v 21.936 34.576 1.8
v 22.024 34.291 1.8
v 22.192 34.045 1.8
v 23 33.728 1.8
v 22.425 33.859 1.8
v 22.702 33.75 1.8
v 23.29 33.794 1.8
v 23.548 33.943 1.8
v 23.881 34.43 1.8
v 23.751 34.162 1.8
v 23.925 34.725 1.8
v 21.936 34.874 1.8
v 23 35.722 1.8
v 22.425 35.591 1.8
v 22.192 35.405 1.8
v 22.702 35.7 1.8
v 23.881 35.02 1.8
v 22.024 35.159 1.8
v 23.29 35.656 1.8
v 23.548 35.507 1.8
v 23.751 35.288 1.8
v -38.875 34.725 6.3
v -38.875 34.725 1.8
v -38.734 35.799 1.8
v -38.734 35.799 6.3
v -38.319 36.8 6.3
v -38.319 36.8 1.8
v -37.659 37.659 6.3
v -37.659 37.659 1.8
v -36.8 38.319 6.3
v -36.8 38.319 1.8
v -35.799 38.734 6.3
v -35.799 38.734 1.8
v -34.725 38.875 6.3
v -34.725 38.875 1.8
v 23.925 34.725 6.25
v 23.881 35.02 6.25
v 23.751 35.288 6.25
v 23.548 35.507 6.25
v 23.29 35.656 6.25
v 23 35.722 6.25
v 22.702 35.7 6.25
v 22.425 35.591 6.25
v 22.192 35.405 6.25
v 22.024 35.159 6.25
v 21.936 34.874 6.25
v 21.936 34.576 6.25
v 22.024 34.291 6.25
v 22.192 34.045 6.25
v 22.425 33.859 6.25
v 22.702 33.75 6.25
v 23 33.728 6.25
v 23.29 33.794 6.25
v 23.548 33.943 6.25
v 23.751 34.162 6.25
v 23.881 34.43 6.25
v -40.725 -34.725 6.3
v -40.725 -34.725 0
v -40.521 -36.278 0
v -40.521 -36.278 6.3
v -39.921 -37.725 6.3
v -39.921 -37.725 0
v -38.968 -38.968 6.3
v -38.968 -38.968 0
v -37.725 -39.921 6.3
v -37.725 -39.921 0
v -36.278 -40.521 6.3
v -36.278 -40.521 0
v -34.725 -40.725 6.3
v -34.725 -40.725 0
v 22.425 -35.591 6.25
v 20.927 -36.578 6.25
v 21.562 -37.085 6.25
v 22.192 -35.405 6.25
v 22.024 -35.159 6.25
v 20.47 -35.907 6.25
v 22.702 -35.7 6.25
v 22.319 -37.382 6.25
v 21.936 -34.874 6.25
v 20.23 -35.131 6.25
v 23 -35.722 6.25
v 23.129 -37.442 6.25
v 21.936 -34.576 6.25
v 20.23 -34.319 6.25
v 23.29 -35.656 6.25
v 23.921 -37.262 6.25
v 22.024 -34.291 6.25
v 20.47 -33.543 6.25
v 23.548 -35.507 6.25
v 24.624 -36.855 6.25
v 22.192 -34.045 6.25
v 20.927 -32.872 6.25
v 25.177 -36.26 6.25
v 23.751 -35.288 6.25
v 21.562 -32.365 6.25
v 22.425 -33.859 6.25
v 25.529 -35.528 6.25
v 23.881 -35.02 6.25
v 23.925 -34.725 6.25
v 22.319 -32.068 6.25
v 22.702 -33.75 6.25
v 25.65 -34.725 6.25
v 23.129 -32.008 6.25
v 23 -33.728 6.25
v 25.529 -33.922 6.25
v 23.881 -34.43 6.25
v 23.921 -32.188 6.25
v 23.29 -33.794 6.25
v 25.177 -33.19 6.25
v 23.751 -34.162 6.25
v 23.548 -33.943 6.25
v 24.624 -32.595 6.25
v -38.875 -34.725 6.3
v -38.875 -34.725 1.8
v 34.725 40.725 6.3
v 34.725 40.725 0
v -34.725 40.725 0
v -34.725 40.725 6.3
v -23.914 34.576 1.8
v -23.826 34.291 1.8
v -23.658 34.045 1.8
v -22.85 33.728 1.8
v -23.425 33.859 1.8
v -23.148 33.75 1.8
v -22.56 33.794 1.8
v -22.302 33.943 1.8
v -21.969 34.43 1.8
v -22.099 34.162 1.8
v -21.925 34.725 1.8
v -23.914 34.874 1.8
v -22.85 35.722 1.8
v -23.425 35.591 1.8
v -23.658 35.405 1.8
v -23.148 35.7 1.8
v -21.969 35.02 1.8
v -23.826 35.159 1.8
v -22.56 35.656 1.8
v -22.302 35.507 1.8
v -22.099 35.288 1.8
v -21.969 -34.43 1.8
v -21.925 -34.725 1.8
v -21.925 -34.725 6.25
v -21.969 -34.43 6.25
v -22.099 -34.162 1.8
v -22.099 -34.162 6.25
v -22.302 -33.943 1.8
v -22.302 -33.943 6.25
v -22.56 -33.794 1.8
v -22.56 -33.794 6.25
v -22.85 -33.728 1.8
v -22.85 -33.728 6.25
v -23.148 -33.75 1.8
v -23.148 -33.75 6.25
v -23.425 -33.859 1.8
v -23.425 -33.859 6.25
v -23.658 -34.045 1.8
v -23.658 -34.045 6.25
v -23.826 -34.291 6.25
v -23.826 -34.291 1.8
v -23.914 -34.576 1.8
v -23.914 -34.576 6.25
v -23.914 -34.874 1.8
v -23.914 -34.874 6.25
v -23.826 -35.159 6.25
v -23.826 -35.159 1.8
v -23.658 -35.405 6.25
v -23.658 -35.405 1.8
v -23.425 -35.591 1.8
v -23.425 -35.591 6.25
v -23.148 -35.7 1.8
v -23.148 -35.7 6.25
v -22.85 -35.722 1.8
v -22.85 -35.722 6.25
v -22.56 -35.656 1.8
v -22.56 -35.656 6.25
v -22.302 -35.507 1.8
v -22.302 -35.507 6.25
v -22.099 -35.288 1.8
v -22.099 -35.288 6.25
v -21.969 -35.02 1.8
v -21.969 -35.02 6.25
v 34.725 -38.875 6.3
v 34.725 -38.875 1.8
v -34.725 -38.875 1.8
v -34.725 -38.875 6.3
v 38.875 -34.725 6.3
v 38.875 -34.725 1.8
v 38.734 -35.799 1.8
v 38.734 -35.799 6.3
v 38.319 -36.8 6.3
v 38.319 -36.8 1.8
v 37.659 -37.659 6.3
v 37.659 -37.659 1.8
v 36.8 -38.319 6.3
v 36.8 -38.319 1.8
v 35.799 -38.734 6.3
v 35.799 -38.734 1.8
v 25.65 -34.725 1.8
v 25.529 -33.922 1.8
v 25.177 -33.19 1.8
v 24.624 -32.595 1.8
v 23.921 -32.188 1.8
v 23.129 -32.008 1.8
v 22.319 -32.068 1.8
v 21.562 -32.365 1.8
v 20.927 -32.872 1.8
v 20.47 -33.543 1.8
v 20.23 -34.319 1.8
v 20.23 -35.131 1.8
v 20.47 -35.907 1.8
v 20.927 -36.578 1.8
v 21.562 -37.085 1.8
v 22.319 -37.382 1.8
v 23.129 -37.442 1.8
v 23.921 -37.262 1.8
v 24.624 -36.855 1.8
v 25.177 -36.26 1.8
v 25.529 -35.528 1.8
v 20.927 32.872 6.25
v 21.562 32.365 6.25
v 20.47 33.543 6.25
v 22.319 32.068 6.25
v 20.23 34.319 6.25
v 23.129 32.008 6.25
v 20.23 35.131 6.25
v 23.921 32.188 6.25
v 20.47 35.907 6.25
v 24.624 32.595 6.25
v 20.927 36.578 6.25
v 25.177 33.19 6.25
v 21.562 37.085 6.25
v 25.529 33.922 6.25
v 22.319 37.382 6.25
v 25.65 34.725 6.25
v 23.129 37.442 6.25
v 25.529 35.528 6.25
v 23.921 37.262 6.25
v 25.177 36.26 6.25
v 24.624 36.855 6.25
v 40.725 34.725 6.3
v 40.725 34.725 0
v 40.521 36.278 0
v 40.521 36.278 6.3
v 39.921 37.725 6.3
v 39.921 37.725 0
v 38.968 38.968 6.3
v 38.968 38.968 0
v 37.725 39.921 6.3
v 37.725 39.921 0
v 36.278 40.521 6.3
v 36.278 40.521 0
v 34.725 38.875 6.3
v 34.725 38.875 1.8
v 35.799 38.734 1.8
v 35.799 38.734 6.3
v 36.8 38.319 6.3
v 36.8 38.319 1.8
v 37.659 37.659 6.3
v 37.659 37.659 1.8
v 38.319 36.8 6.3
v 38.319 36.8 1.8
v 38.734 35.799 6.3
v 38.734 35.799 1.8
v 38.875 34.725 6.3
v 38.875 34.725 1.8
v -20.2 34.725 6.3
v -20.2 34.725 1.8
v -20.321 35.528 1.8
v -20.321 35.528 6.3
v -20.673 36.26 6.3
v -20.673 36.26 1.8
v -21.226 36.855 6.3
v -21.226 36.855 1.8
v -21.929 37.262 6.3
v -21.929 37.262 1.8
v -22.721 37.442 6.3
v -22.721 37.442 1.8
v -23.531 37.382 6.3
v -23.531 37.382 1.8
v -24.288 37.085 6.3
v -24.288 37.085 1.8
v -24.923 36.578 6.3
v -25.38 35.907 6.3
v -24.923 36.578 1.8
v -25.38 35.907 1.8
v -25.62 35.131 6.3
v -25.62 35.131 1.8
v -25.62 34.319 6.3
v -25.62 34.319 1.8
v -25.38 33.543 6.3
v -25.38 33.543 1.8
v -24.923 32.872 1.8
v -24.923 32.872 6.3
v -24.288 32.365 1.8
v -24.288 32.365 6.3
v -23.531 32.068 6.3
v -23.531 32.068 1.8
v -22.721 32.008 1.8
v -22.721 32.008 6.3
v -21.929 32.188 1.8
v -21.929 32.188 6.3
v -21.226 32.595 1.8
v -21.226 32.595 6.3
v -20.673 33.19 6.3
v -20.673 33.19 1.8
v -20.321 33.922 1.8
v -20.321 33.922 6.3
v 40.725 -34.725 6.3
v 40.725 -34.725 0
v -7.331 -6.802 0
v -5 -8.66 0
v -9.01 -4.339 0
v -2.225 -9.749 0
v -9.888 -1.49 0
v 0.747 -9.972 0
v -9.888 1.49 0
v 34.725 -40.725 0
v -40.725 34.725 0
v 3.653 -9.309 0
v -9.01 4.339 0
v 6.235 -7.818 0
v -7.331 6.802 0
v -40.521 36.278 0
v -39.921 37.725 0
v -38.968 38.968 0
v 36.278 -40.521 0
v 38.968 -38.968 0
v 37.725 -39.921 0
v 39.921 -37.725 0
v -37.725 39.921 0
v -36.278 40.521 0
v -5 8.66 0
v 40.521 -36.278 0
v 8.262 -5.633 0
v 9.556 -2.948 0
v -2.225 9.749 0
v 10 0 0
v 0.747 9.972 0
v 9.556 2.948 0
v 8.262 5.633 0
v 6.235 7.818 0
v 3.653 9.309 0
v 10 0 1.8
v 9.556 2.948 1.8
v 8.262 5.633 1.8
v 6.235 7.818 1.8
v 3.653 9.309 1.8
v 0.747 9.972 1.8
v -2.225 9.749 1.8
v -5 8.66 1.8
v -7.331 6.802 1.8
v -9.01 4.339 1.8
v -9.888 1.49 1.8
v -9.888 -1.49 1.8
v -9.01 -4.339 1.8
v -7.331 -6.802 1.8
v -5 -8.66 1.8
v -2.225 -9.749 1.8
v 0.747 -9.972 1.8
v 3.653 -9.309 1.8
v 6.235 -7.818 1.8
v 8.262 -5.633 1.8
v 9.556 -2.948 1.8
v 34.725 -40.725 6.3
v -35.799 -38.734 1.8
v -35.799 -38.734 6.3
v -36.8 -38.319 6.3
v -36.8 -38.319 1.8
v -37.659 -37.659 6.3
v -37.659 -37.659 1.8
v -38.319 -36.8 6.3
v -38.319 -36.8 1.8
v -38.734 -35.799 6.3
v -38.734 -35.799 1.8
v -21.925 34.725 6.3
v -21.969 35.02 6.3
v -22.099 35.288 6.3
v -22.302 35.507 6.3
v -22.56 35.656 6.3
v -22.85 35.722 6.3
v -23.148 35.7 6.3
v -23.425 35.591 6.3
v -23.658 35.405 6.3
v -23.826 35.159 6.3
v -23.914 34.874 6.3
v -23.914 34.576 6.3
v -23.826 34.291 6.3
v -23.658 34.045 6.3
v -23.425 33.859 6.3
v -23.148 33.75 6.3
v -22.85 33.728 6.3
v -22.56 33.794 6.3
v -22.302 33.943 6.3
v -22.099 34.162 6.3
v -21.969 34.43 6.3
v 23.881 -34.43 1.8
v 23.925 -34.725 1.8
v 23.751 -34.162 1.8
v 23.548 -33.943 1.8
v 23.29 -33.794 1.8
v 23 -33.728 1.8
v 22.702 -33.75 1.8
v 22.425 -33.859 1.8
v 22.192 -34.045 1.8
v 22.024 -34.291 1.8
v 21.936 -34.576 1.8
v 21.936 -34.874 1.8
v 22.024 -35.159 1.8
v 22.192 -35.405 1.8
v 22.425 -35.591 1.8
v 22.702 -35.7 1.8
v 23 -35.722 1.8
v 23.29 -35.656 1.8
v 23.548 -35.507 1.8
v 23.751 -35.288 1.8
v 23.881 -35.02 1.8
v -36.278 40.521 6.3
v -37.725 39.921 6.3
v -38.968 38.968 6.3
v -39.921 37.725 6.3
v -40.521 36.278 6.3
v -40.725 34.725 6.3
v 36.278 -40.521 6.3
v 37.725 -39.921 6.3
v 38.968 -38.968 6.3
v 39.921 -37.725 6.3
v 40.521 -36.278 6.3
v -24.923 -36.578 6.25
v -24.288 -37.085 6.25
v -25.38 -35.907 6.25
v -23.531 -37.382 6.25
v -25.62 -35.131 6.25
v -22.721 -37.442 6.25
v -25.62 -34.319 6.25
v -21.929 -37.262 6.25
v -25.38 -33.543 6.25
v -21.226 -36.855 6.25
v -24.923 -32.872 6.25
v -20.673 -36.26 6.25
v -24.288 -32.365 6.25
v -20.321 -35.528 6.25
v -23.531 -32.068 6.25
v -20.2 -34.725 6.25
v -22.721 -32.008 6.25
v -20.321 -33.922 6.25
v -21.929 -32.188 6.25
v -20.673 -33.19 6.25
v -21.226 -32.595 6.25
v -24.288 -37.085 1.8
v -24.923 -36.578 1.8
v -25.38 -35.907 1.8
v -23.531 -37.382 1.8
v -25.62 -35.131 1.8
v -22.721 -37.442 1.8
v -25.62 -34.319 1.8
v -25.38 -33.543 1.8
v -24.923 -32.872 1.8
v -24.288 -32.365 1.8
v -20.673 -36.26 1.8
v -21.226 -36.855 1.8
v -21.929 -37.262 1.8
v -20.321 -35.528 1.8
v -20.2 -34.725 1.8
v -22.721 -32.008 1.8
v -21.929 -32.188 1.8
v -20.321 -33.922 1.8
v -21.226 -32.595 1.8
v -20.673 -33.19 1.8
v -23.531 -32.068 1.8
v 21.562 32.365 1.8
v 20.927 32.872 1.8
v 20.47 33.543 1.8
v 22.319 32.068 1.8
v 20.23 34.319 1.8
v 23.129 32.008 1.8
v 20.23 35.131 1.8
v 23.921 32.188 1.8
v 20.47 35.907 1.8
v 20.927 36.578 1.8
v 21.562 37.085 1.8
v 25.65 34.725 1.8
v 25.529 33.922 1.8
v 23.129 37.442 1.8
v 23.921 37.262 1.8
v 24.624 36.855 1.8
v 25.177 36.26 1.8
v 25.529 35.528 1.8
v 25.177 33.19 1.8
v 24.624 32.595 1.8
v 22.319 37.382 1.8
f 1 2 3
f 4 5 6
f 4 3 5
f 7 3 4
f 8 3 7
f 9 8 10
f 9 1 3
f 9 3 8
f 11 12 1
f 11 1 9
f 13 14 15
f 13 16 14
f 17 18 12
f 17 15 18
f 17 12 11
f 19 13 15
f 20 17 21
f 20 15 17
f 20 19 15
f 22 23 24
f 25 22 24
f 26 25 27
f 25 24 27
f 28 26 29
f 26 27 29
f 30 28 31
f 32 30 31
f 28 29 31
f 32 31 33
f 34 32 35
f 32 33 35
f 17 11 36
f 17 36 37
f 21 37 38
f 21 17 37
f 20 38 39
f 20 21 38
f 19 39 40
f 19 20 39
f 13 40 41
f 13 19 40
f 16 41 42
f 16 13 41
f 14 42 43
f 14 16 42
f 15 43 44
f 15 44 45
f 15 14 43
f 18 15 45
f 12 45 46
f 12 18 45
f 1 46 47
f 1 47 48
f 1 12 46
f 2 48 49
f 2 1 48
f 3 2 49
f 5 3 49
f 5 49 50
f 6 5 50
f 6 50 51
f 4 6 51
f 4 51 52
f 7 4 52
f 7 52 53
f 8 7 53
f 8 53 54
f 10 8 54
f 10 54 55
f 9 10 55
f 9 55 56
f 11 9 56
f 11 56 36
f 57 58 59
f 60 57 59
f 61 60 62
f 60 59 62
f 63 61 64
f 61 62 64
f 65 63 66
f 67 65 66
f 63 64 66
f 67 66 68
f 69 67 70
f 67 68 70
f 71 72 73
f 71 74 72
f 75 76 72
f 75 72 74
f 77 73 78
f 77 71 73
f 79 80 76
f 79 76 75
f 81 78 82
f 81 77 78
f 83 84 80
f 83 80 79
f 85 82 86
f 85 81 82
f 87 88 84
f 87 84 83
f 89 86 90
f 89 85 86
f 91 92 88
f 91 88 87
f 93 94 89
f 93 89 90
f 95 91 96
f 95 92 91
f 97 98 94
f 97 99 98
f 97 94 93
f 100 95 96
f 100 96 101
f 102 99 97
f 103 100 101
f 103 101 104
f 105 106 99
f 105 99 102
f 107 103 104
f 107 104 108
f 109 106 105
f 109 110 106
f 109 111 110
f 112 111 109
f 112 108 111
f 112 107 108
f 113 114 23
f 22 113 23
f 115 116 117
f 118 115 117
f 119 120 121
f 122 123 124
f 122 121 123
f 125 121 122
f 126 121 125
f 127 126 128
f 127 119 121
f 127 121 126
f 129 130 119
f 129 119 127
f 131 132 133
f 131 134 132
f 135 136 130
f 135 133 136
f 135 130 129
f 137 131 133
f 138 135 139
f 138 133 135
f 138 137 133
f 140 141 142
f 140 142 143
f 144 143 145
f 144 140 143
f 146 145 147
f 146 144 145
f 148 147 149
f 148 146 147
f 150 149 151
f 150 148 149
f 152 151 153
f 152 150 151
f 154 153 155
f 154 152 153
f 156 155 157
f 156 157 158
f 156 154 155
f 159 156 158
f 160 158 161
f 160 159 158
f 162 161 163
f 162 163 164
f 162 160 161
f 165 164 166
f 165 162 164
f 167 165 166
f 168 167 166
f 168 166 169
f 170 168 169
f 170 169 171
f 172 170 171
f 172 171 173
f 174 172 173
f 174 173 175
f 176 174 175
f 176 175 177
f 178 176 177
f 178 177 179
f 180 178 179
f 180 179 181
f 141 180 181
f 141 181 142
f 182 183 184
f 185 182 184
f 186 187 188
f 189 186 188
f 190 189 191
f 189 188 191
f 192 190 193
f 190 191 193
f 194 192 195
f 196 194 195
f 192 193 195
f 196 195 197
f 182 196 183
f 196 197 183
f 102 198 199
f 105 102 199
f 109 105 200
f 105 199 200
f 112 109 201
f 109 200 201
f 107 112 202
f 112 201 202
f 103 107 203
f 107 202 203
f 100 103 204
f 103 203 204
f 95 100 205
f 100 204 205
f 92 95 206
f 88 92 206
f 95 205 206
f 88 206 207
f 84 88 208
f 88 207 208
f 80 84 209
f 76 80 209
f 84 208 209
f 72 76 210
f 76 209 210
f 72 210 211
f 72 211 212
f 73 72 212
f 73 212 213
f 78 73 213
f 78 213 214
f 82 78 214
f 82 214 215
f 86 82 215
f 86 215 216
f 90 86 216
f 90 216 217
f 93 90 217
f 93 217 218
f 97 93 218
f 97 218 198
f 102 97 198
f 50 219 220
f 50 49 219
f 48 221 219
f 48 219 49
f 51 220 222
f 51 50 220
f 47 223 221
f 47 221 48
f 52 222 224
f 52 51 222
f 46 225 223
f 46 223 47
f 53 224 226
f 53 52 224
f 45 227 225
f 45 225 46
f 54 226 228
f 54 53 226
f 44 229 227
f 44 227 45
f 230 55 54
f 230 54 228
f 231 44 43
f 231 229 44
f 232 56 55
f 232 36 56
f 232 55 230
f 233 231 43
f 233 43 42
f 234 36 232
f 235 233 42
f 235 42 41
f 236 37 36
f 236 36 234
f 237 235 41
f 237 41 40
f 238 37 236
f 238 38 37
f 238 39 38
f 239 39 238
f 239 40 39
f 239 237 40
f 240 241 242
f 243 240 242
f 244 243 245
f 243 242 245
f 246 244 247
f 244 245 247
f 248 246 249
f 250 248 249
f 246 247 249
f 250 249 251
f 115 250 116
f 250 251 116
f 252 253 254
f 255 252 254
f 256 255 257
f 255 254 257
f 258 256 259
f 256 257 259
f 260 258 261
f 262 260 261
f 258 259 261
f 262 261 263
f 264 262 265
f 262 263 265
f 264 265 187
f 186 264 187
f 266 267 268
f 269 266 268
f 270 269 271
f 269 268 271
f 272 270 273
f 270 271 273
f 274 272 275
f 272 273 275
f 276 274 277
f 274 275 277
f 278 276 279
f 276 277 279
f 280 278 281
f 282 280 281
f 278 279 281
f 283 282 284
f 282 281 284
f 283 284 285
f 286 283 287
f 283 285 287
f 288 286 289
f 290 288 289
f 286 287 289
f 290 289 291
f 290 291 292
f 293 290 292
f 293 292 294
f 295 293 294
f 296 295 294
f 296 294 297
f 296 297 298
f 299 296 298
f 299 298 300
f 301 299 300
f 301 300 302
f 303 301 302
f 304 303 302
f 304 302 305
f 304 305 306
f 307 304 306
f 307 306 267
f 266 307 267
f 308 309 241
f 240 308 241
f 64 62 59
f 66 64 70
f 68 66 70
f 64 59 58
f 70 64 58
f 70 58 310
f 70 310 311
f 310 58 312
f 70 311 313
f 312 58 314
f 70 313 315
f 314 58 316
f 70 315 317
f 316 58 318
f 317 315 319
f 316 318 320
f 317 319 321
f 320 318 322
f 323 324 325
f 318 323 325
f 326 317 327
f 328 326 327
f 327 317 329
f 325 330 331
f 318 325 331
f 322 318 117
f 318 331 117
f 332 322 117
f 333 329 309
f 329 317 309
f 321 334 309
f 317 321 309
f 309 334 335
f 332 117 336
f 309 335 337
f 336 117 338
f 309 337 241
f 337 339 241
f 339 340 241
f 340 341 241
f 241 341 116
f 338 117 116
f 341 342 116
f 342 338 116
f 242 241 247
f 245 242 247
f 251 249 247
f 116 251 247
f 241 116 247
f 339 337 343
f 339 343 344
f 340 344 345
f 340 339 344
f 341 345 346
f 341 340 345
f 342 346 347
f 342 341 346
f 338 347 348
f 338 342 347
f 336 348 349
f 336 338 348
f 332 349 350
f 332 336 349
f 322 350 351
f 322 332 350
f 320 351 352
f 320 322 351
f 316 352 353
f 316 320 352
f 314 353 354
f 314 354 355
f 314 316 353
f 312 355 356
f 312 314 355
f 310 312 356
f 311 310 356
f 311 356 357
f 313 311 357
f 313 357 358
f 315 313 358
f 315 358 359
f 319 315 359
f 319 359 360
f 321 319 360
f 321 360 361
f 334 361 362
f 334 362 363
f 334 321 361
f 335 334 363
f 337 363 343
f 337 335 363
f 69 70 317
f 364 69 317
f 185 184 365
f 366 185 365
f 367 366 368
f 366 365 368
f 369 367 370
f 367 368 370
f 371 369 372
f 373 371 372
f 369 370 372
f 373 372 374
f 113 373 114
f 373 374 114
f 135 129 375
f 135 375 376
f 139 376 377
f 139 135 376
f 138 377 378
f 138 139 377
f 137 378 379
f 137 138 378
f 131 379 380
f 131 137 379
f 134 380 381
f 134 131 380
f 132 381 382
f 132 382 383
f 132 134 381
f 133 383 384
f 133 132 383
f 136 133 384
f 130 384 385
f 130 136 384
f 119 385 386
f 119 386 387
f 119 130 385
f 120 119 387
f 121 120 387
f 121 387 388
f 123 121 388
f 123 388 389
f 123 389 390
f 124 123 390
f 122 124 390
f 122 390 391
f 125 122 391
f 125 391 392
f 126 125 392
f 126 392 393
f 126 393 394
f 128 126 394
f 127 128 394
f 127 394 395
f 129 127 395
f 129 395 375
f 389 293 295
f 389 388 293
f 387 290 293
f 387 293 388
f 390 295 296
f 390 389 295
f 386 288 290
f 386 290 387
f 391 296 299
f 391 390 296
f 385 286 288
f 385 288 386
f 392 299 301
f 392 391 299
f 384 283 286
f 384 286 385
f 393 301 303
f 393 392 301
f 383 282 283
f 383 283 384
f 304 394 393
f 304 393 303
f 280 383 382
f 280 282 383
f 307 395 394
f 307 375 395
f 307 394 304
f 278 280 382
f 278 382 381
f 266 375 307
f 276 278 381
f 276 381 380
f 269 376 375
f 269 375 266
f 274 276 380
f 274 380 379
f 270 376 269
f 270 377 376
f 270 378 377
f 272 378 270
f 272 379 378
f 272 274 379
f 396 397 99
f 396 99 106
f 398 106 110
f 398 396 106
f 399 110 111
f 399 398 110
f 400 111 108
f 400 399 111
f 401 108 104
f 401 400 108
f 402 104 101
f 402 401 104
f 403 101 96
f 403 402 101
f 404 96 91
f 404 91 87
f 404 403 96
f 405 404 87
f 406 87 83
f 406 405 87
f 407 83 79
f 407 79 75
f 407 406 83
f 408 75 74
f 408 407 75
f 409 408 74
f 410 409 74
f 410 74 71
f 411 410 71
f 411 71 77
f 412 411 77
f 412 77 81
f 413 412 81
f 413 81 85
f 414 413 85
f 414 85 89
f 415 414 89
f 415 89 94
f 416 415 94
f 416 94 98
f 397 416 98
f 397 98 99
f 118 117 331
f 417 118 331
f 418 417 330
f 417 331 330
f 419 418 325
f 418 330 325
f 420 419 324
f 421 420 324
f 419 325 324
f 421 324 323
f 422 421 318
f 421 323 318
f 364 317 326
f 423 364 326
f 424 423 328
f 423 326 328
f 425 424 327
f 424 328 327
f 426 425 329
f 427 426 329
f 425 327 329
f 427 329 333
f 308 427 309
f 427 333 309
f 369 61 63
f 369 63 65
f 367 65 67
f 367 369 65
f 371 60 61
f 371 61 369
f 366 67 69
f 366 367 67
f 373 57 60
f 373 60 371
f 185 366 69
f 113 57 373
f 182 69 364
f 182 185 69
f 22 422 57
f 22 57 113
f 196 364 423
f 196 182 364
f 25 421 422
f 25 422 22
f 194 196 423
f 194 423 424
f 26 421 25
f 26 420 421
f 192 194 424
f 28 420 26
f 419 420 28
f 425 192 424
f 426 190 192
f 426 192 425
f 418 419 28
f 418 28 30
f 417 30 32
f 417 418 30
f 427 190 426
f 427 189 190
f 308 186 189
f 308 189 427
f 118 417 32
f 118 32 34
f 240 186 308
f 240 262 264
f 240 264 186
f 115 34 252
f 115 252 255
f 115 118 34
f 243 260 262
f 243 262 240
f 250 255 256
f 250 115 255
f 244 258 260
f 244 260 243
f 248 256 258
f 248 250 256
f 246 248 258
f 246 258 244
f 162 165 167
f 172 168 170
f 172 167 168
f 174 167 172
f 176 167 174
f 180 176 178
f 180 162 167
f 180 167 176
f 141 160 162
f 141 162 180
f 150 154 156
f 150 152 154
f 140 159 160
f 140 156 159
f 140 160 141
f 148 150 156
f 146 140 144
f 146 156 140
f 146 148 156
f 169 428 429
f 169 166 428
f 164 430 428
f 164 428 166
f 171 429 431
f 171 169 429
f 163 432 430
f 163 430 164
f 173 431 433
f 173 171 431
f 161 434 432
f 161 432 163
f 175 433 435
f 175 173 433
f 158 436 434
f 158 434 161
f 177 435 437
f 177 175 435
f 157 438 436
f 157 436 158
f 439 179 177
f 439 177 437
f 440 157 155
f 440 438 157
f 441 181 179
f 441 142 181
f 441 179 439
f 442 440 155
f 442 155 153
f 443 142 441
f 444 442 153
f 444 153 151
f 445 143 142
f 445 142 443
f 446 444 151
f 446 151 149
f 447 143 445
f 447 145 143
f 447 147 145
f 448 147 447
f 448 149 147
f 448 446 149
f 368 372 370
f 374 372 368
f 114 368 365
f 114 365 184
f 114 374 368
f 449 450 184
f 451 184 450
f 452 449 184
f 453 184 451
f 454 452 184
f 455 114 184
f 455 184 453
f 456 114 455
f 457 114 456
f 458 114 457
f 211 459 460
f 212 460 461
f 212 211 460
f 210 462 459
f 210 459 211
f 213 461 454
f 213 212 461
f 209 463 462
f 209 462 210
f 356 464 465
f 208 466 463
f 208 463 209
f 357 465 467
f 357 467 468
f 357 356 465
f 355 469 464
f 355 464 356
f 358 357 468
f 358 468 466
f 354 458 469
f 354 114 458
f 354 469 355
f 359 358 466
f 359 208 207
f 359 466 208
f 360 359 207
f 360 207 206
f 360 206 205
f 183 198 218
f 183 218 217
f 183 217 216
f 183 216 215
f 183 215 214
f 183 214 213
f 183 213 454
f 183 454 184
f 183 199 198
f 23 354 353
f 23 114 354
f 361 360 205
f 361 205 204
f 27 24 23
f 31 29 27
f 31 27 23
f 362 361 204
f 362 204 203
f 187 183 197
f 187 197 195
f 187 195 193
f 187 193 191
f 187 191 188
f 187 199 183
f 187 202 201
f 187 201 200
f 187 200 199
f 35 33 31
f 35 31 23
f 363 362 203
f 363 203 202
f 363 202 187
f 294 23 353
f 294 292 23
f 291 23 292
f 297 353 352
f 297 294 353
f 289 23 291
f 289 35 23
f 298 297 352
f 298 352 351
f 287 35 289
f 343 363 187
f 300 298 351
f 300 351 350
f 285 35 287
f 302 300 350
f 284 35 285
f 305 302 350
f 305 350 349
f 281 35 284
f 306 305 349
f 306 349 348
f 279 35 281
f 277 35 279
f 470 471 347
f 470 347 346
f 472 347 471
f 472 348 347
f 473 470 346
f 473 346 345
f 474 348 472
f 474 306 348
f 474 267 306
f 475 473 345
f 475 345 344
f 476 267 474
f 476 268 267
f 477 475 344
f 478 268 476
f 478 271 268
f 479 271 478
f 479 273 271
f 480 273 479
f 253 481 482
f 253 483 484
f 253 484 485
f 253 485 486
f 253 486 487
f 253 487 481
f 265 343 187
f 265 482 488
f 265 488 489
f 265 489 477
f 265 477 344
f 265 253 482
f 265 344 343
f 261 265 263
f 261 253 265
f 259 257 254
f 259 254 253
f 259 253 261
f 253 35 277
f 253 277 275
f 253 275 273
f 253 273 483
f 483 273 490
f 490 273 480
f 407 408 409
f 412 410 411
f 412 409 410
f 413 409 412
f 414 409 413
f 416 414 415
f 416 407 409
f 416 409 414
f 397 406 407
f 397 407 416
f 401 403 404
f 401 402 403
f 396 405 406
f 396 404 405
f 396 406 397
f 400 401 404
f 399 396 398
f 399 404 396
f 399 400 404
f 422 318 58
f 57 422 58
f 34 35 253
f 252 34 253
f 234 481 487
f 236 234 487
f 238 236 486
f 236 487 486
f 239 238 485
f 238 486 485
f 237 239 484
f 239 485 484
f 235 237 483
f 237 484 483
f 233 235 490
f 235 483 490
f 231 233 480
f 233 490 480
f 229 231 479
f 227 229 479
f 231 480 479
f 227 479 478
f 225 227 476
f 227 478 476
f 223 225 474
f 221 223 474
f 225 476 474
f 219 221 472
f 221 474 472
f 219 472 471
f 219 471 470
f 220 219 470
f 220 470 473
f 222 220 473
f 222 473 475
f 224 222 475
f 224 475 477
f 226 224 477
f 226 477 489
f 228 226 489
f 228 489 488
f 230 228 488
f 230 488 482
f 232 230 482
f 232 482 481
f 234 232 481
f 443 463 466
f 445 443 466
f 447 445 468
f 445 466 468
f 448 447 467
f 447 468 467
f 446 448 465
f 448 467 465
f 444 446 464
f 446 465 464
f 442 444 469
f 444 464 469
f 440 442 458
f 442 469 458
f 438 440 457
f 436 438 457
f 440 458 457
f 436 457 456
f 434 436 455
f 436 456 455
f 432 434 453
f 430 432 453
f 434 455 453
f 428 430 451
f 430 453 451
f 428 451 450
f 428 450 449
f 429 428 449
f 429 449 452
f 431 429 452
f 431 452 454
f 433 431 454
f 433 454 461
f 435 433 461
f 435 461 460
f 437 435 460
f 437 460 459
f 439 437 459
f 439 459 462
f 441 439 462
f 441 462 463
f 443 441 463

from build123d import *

# Parameters (mm, degrees)
F0_R     = 2.725
F0_R_2   = 10
F0_R_3   = 1
F1_DEPTH = 1.8
F2_DEPTH = 6.3
F3_DEPTH = 6.3
F4_DEPTH = 6.25


with BuildPart() as f1:
    # F0 (on Top) → F1 (new body)
    with BuildSketch(Plane.XY):
        with BuildLine():
            Line((38.875, -34.725), (38.875, 34.725))
            ThreePointArc((38.875, 34.725), (37.659493, 37.659493), (34.725, 38.875))
            Line((34.725, 38.875), (-34.725, 38.875))
            ThreePointArc((-34.725, 38.875), (-37.659493, 37.659493), (-38.875, 34.725))
            Line((-38.875, 34.725), (-38.875, -34.725))
            ThreePointArc((-38.875, -34.725), (-37.659493, -37.659493), (-34.725, -38.875))
            Line((-34.725, -38.875), (34.725, -38.875))
            ThreePointArc((34.725, -38.875), (37.659493, -37.659493), (38.875, -34.725))
        make_face()
        with Locations((-22.925, -34.725)):
            Circle(F0_R, mode=Mode.SUBTRACT)
        with Locations((22.925, -34.725)):
            Circle(F0_R, mode=Mode.SUBTRACT)
        with Locations((-22.925, 34.725)):
            Circle(F0_R, mode=Mode.SUBTRACT)
        Circle(F0_R_2, mode=Mode.SUBTRACT)
        with Locations((22.925, 34.725)):
            Circle(F0_R, mode=Mode.SUBTRACT)
        with Locations((-22.925, 34.725)):
            Circle(F0_R)
        with Locations((-22.925, 34.725)):
            Circle(F0_R_3, mode=Mode.SUBTRACT)
        with Locations((-22.925, 34.725)):
            Circle(F0_R_3)
        with Locations((22.925, -34.725)):
            Circle(F0_R)
        with Locations((22.925, -34.725)):
            Circle(F0_R_3, mode=Mode.SUBTRACT)
        with Locations((22.925, -34.725)):
            Circle(F0_R_3)
        with Locations((-22.925, -34.725)):
            Circle(F0_R)
        with Locations((-22.925, -34.725)):
            Circle(F0_R_3, mode=Mode.SUBTRACT)
        with Locations((-22.925, -34.725)):
            Circle(F0_R_3)
        with Locations((22.925, 34.725)):
            Circle(F0_R)
        with Locations((22.925, 34.725)):
            Circle(F0_R_3, mode=Mode.SUBTRACT)
        with Locations((22.925, 34.725)):
            Circle(F0_R_3)
    extrude(amount=F1_DEPTH)

    # F0 (on Top) → F2 (join)
    with BuildSketch(Plane.XY):
        with BuildLine():
            Line((-34.725, -40.725), (34.725, -40.725))
            ThreePointArc((34.725, -40.725), (38.967641, -38.967641), (40.725, -34.725))
            Line((40.725, -34.725), (40.725, 34.725))
            ThreePointArc((40.725, 34.725), (38.967641, 38.967641), (34.725, 40.725))
            Line((34.725, 40.725), (-34.725, 40.725))
            ThreePointArc((-34.725, 40.725), (-38.967641, 38.967641), (-40.725, 34.725))
            Line((-40.725, 34.725), (-40.725, -34.725))
            ThreePointArc((-40.725, -34.725), (-38.967641, -38.967641), (-34.725, -40.725))
        make_face()
        with BuildLine():
            ThreePointArc((34.725, 38.875), (37.659493, 37.659493), (38.875, 34.725))
            Line((38.875, 34.725), (38.875, -34.725))
            ThreePointArc((38.875, -34.725), (37.659493, -37.659493), (34.725, -38.875))
            Line((34.725, -38.875), (-34.725, -38.875))
            ThreePointArc((-34.725, -38.875), (-37.659493, -37.659493), (-38.875, -34.725))
            Line((-38.875, -34.725), (-38.875, 34.725))
            ThreePointArc((-38.875, 34.725), (-37.659493, 37.659493), (-34.725, 38.875))
            Line((-34.725, 38.875), (34.725, 38.875))
        make_face(mode=Mode.SUBTRACT)
    extrude(amount=F2_DEPTH)

    # F0 (on Top) → F3 (join)
    with BuildSketch(Plane.XY):
        with Locations((-22.925, 34.725)):
            Circle(F0_R)
        with Locations((-22.925, 34.725)):
            Circle(F0_R_3, mode=Mode.SUBTRACT)
    extrude(amount=F3_DEPTH)

    # F0 (on Top) → F4 (join)
    with BuildSketch(Plane.XY):
        with Locations((22.925, 34.725)):
            Circle(F0_R)
        with Locations((22.925, 34.725)):
            Circle(F0_R_3, mode=Mode.SUBTRACT)
        with Locations((22.925, -34.725)):
            Circle(F0_R)
        with Locations((22.925, -34.725)):
            Circle(F0_R_3, mode=Mode.SUBTRACT)
        with Locations((-22.925, -34.725)):
            Circle(F0_R)
        with Locations((-22.925, -34.725)):
            Circle(F0_R_3, mode=Mode.SUBTRACT)
    extrude(amount=F4_DEPTH)


solid = f1.part
